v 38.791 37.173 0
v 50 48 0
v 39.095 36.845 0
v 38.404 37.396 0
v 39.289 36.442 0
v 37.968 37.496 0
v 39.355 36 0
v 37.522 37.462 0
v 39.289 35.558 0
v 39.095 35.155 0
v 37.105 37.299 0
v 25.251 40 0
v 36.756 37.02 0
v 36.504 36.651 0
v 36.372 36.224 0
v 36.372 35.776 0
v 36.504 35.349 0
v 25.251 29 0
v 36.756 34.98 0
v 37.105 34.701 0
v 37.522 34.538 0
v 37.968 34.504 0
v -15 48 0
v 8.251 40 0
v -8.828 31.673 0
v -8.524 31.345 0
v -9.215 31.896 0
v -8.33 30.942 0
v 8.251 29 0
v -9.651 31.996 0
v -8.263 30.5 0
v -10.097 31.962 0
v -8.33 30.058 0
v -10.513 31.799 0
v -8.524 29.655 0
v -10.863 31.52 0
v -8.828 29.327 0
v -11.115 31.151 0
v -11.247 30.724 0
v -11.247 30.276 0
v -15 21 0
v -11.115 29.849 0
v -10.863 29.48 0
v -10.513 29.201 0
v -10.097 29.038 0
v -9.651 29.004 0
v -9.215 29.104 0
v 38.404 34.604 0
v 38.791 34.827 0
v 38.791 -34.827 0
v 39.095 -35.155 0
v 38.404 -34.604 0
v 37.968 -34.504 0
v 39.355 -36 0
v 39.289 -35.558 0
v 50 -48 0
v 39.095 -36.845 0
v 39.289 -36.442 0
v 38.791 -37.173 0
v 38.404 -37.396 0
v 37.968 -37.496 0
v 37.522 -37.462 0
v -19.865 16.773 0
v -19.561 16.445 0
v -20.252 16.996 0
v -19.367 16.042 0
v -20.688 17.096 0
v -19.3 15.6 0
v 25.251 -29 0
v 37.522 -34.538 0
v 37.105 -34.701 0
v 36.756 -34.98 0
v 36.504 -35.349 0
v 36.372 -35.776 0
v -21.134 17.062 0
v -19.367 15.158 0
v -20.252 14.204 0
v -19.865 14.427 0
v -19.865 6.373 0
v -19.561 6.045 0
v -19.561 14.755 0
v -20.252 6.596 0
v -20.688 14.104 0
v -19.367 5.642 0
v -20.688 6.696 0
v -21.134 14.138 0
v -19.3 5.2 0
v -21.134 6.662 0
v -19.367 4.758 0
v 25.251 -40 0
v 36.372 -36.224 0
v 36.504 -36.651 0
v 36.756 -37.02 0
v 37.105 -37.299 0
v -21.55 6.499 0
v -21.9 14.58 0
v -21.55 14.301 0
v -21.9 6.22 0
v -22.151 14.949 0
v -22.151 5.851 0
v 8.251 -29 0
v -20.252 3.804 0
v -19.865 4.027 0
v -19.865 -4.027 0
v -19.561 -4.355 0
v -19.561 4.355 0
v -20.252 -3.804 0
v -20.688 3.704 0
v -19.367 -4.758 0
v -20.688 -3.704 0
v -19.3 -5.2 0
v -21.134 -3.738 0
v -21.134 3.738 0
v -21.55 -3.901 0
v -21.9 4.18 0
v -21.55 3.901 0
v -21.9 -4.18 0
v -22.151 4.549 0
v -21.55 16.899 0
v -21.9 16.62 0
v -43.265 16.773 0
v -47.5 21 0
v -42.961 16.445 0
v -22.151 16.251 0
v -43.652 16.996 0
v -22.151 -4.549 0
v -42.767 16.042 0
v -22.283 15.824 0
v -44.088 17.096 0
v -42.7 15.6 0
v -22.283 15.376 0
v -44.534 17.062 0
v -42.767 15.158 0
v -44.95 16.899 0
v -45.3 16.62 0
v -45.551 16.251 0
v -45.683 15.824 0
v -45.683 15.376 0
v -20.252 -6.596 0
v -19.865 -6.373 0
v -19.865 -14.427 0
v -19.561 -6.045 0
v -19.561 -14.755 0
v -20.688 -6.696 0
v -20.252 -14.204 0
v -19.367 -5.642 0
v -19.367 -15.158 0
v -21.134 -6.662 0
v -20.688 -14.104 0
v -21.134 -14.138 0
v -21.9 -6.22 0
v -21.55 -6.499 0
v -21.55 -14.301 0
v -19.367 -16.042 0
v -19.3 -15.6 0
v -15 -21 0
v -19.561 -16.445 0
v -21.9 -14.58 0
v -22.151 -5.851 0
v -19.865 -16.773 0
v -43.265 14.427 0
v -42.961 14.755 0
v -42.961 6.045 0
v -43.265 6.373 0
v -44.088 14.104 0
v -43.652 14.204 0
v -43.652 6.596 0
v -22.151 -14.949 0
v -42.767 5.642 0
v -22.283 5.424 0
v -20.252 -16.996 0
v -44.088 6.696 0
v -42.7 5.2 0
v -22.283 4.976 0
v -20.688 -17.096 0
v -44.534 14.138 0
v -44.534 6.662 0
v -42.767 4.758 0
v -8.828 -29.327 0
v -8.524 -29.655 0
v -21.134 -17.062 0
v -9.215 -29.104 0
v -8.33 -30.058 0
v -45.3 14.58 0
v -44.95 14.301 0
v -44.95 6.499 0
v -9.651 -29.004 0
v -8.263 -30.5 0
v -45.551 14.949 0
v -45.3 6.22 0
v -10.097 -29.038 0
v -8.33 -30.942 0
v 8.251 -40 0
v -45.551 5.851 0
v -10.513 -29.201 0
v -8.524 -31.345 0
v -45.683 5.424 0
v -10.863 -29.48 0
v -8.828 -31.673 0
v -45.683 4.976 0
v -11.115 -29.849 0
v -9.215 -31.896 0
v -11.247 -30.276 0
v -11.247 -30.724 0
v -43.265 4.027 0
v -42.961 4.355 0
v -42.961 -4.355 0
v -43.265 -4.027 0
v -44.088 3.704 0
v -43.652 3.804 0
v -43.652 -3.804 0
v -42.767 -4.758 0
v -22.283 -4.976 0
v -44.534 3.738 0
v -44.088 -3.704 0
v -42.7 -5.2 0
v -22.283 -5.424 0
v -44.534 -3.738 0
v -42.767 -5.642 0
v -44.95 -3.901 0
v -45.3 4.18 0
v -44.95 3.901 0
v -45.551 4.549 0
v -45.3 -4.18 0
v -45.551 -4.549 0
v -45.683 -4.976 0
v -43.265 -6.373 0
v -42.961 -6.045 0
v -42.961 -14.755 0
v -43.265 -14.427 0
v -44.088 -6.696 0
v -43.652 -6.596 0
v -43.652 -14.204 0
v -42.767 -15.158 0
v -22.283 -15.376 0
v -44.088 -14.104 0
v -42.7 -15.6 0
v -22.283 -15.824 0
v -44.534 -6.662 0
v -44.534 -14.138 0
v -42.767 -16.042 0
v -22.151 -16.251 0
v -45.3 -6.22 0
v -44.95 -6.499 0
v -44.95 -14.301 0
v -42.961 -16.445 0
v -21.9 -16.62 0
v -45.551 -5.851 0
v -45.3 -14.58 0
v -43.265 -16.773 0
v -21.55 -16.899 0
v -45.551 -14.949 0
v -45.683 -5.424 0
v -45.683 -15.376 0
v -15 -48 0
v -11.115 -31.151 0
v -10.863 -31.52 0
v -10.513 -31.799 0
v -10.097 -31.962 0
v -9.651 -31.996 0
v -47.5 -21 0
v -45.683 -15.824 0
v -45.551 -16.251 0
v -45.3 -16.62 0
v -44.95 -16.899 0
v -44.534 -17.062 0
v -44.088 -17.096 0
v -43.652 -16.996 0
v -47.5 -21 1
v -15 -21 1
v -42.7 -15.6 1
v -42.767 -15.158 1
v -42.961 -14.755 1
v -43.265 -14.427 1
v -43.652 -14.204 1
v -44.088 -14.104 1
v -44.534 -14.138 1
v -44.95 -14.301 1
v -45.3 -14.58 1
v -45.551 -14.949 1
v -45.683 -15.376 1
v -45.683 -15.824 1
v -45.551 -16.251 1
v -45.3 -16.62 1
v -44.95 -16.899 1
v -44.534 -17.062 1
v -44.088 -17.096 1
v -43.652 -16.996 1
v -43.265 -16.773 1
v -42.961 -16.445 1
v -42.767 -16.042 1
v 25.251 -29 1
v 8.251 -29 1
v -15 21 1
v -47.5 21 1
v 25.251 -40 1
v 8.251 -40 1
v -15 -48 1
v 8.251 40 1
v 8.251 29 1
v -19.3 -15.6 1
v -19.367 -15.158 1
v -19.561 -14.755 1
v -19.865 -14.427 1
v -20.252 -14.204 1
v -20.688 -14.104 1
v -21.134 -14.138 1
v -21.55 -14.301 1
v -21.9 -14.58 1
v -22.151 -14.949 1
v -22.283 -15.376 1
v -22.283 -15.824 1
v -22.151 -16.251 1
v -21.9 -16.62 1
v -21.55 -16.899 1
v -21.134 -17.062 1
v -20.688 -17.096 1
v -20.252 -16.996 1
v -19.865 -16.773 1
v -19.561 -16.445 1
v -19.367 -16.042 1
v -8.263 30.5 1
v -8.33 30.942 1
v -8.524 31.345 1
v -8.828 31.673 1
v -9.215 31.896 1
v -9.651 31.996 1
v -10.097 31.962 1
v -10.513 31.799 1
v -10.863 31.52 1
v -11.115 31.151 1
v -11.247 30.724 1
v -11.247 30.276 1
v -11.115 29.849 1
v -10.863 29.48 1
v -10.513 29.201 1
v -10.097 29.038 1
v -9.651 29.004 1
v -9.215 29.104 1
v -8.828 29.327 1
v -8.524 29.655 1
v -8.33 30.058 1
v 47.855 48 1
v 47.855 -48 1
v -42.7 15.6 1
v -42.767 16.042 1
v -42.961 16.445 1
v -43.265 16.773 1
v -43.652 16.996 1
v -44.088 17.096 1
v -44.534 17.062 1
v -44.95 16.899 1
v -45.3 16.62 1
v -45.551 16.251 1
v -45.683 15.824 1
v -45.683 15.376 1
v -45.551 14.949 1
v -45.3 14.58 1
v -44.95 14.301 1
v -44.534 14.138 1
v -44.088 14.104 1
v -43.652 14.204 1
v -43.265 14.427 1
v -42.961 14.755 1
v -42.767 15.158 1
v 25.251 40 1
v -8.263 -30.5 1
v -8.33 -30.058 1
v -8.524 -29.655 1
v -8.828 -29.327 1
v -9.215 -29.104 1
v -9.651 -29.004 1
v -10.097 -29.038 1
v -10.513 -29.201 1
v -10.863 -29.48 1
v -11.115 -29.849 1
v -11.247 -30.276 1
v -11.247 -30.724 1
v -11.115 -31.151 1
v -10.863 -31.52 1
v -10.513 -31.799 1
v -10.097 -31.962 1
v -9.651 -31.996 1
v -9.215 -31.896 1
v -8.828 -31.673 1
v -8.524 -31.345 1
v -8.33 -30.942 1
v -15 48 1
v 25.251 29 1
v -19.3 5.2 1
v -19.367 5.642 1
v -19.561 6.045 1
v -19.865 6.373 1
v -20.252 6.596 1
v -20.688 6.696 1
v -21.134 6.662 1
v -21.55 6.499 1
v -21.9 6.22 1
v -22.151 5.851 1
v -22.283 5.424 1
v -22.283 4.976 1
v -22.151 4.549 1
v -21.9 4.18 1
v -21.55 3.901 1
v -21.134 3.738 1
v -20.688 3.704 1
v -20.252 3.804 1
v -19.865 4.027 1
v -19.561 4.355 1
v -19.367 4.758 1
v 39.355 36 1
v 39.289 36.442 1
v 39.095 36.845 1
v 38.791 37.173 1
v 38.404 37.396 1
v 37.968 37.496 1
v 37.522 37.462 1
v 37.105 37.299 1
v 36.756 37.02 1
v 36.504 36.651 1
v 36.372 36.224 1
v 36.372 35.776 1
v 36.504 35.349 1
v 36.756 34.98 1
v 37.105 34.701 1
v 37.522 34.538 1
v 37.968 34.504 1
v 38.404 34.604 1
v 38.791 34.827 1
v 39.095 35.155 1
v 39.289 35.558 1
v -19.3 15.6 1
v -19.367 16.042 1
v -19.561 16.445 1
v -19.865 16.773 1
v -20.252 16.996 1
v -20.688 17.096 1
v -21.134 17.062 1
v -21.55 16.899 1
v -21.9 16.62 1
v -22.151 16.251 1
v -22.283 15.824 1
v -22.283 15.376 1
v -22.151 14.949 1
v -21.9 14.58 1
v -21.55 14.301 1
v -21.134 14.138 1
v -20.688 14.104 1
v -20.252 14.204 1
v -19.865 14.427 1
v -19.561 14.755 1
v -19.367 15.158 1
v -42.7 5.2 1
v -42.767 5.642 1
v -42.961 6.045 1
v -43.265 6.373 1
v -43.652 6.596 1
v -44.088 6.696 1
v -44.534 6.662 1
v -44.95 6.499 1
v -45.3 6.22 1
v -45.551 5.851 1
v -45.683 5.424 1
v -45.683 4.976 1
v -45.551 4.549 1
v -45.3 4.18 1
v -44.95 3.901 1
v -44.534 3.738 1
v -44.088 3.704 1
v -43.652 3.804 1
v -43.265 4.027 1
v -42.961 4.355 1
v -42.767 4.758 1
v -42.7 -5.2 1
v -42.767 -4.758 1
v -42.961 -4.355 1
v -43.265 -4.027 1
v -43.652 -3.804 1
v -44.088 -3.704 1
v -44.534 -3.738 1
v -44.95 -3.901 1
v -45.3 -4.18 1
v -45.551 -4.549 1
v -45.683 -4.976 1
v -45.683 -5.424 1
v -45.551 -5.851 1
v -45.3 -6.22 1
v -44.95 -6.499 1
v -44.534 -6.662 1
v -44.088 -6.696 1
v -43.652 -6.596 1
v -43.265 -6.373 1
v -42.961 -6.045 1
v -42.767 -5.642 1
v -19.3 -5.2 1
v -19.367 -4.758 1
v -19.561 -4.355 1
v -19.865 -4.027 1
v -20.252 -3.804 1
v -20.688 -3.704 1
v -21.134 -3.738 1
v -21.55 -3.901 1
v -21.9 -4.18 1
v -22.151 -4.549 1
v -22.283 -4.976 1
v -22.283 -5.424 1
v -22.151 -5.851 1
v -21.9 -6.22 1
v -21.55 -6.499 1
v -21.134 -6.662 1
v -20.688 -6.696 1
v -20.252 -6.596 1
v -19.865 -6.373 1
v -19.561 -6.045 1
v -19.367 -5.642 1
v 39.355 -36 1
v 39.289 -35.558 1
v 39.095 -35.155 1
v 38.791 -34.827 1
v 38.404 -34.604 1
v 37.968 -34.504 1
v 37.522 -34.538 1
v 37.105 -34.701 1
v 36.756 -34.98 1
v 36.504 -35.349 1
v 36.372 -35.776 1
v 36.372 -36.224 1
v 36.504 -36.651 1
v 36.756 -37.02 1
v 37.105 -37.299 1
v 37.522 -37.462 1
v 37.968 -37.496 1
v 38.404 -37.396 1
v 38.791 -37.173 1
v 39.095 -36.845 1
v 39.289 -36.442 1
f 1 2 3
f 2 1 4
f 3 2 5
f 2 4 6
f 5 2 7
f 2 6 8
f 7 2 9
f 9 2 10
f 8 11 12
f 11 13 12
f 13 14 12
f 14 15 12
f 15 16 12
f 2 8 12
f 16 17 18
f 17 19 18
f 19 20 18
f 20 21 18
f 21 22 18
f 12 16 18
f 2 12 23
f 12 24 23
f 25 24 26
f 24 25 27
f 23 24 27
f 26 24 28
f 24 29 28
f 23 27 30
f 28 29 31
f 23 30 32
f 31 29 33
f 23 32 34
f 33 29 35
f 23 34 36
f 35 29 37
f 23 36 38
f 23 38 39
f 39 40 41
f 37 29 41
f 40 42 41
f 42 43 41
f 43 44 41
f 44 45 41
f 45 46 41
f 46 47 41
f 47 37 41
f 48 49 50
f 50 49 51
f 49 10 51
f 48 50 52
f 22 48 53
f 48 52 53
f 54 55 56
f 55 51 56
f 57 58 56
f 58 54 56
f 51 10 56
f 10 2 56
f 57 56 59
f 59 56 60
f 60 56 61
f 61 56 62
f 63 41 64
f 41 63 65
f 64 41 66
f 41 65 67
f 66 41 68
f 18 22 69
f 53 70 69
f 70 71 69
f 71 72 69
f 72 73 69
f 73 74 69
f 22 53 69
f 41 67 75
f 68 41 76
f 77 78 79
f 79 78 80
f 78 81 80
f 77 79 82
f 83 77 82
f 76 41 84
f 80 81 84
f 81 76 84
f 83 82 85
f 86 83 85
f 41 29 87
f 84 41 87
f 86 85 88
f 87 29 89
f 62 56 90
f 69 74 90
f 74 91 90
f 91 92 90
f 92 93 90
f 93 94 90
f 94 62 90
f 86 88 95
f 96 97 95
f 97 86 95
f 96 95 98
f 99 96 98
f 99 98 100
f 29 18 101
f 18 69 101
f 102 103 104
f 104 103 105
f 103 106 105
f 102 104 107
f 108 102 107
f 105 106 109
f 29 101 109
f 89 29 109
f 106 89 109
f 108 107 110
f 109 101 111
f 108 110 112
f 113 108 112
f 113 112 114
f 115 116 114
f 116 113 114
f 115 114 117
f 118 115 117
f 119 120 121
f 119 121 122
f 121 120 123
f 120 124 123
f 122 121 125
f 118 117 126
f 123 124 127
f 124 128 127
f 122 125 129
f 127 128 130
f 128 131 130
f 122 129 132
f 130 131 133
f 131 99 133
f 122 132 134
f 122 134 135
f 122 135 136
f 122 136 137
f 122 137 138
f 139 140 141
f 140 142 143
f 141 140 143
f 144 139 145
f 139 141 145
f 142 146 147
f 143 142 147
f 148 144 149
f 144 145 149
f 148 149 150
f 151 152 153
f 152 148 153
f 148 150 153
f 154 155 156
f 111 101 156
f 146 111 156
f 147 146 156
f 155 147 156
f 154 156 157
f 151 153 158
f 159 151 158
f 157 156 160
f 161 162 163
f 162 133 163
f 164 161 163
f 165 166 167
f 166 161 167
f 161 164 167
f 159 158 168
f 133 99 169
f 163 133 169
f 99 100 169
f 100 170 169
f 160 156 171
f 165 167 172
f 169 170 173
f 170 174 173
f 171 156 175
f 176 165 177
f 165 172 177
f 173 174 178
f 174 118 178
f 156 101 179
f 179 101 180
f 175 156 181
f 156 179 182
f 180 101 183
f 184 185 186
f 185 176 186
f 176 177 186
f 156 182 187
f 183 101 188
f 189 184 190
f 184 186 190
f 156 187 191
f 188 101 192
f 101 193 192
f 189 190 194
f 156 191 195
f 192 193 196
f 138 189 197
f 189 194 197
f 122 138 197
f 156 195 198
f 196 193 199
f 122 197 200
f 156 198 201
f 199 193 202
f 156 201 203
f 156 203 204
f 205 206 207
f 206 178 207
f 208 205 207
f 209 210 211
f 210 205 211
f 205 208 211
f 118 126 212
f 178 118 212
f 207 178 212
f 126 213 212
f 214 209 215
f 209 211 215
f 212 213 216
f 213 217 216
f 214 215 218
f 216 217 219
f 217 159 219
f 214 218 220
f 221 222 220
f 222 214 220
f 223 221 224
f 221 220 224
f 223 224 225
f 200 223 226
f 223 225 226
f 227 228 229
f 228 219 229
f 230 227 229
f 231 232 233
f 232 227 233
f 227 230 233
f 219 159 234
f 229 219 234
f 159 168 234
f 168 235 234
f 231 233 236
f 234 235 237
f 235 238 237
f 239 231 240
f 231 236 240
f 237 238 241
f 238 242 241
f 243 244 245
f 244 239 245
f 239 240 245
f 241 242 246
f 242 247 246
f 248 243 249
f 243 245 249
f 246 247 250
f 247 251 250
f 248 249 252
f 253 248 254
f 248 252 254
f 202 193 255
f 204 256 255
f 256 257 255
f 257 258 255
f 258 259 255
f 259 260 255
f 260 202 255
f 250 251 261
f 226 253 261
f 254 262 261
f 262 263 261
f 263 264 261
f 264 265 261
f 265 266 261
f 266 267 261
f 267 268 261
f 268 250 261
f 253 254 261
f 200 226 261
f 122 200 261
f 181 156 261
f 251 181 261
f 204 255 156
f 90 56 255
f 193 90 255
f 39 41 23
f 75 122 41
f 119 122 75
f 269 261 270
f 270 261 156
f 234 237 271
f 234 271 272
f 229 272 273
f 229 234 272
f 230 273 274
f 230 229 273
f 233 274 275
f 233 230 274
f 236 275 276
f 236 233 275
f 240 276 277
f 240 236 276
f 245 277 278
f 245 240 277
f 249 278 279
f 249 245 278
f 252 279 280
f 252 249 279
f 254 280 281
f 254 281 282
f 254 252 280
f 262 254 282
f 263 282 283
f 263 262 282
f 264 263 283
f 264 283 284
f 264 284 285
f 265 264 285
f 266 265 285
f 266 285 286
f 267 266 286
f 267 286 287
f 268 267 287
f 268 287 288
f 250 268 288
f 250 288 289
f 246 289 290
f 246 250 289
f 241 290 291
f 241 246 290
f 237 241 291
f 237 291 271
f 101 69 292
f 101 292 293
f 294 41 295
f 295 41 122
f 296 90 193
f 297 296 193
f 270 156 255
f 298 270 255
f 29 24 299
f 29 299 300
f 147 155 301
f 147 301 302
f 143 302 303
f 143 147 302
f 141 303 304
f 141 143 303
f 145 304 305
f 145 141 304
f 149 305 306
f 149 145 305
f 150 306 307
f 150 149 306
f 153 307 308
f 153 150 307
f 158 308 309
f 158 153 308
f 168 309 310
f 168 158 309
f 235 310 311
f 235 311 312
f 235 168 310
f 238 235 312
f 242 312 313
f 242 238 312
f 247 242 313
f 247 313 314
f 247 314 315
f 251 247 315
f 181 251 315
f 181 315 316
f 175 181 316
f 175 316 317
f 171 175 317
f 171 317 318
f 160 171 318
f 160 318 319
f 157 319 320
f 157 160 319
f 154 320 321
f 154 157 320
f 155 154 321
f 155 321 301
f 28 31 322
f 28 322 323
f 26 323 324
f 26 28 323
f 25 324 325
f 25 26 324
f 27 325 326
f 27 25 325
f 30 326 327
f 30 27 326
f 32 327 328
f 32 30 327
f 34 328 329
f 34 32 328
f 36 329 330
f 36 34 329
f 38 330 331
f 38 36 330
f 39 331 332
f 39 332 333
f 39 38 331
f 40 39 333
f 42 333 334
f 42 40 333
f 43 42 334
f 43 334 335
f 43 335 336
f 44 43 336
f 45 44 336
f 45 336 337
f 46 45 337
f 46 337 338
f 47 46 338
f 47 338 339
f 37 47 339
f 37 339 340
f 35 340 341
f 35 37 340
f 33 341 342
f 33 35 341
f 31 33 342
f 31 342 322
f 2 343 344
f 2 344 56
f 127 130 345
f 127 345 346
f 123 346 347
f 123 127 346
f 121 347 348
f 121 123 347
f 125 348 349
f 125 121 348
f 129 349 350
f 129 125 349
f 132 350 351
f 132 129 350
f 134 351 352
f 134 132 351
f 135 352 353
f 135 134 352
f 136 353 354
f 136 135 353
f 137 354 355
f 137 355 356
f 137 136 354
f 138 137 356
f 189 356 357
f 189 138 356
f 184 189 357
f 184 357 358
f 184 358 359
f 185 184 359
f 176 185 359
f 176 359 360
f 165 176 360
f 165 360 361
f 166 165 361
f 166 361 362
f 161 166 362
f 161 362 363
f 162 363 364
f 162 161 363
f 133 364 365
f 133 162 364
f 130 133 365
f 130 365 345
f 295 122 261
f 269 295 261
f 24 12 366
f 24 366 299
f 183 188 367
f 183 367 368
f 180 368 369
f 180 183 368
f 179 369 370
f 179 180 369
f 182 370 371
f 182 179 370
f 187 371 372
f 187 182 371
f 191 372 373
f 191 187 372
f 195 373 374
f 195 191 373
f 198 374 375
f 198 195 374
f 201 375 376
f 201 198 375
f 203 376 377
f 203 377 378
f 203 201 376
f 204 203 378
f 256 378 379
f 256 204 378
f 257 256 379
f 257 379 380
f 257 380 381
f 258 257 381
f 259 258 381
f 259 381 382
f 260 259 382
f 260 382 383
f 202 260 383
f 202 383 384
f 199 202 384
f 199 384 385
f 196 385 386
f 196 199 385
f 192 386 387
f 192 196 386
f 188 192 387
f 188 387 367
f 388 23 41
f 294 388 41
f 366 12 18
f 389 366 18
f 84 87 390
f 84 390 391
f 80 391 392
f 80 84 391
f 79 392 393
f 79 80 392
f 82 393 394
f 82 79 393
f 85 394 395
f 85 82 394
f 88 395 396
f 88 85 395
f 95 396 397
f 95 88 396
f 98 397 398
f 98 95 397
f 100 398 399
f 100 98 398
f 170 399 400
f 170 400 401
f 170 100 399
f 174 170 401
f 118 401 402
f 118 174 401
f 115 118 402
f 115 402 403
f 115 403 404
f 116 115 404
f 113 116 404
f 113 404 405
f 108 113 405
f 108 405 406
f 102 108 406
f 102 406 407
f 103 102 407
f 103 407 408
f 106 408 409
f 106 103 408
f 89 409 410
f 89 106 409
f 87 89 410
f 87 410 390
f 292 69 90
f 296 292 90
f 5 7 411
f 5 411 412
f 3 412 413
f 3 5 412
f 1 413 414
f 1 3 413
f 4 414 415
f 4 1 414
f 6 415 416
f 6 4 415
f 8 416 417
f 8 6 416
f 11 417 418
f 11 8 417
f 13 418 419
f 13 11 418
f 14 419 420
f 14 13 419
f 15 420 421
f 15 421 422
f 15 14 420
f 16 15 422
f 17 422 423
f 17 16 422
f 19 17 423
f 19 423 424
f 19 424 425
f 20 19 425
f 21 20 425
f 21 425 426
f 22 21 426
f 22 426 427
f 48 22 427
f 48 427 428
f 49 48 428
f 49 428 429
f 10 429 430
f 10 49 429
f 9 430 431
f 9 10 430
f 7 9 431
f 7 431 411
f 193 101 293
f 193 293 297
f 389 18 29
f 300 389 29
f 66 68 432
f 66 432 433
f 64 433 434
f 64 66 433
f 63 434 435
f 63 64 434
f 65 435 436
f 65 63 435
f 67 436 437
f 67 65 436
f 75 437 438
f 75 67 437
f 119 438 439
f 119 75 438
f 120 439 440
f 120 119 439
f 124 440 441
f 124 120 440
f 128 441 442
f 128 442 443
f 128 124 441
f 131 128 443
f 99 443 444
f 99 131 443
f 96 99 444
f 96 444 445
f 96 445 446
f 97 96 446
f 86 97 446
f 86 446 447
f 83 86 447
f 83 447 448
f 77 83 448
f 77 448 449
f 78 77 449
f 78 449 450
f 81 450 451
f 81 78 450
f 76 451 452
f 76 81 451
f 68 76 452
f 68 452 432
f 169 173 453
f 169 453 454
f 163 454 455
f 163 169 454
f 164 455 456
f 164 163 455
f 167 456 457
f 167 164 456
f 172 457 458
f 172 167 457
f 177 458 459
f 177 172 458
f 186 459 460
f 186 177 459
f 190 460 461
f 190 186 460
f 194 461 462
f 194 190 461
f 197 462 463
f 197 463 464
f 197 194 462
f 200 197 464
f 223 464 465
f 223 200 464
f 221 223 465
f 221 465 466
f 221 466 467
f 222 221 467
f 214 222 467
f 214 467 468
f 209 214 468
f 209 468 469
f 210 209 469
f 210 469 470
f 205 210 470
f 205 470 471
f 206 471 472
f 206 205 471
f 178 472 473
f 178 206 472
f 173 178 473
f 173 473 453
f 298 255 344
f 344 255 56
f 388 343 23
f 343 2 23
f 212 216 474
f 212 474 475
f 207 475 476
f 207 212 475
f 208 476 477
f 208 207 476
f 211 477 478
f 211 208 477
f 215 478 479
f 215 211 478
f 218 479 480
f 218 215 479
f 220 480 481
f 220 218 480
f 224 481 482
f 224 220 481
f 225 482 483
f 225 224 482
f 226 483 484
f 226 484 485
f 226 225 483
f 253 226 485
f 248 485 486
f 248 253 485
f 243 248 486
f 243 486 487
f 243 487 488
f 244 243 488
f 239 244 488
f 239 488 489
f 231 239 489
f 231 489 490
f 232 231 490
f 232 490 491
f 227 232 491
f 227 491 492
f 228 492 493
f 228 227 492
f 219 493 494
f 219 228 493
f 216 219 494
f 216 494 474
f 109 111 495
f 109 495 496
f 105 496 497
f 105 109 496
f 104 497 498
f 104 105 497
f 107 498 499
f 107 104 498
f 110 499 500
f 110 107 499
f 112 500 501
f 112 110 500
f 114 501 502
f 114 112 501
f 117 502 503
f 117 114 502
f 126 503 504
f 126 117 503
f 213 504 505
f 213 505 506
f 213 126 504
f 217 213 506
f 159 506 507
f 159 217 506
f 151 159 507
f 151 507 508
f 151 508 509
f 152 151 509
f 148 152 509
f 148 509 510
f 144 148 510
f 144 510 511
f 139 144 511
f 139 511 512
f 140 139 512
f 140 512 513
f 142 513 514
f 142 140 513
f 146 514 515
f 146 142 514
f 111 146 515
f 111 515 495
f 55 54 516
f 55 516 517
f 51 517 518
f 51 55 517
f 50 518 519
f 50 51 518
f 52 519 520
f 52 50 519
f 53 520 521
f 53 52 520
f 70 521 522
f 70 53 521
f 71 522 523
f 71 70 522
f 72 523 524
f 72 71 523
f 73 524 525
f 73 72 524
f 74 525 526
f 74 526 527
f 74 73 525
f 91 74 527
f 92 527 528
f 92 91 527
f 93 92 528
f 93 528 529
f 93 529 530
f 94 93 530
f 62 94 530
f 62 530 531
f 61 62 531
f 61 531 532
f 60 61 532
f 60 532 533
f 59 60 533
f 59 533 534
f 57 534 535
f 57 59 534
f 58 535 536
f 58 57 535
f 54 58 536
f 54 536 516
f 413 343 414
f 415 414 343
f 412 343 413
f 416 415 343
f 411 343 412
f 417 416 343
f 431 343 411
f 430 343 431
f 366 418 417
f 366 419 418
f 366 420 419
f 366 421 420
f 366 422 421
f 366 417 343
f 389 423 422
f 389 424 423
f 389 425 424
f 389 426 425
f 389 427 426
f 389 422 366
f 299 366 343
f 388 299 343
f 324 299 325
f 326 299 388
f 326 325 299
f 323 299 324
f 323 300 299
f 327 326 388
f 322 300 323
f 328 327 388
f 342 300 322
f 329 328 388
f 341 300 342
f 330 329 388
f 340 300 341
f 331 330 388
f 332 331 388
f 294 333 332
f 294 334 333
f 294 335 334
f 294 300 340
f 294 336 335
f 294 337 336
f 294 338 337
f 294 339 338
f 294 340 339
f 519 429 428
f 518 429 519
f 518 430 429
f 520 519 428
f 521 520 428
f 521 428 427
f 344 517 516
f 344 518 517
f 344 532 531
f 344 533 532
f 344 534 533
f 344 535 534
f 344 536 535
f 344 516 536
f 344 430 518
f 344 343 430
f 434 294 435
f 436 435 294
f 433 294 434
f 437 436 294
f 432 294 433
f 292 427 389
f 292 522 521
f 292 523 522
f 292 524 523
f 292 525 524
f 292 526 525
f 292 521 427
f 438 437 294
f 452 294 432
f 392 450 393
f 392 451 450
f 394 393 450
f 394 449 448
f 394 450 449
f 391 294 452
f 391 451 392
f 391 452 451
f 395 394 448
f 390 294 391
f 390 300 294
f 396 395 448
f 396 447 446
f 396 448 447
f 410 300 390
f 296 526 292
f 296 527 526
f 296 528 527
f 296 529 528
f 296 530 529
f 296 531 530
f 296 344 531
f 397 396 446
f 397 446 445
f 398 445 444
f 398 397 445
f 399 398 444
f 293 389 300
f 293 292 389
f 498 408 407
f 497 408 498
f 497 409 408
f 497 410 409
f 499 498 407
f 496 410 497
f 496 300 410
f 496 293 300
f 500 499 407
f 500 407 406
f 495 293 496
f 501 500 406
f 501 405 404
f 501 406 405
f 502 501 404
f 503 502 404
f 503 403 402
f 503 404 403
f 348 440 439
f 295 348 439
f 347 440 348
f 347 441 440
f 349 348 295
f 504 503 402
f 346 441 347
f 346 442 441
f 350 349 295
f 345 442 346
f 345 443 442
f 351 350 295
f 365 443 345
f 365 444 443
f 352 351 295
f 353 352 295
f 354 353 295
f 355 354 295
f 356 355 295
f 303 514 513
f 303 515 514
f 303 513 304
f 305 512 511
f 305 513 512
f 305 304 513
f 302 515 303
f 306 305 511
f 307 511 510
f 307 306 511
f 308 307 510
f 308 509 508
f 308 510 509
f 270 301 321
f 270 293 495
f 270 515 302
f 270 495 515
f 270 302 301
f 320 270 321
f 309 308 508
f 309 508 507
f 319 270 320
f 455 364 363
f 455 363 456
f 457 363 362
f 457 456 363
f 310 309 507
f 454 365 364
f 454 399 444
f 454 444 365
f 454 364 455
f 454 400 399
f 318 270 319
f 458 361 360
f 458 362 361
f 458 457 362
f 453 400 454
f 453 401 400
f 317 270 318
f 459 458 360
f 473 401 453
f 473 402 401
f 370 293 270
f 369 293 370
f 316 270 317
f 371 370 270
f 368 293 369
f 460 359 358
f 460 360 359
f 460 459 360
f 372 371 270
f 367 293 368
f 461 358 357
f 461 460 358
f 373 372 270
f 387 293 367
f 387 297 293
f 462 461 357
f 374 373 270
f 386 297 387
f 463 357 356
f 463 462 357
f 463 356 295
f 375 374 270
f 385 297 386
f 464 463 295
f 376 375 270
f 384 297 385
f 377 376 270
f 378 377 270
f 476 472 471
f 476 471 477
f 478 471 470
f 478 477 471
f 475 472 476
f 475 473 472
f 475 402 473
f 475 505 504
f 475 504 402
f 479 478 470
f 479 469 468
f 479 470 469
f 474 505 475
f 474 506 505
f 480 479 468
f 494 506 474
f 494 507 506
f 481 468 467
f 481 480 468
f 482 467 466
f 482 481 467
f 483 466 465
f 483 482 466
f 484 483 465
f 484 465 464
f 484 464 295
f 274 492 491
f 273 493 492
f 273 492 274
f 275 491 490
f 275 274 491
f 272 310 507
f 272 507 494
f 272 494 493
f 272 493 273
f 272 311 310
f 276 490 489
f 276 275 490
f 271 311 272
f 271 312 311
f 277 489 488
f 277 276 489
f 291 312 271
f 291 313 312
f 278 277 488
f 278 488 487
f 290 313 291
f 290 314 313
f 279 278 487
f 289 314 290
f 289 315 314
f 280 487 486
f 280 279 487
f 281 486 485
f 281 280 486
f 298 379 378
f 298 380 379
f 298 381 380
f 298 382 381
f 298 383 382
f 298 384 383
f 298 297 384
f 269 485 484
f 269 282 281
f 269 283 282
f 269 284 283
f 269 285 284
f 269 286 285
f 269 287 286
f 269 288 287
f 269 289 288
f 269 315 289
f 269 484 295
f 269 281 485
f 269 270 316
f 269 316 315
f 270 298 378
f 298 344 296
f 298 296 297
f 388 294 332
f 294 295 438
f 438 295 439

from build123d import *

# Parameters (mm, degrees)
SKETCH_1_R          = 1.5
SKETCH_1_W          = 17
SKETCH_1_H          = 11
EXTRUDE_1_DEPTH     = 1
CUT_EXTRUDE_1_DEPTH = 109.245092268


with BuildPart() as part:
    # Эскиз1 → Бобышка-Вытянуть1 (new body)
    with BuildSketch(Plane(origin=(0, 0, 0), x_dir=(-1, 0, 0), z_dir=(0, 0, 1))):
        Polygon((47.5, 21), (15, 21), (15, 48), (-50, 48), (-50, -48), (15, -48), (15, -21), (47.5, -21), align=None)
        with Locations(Location((20.8, -15.6, 0), (0, 0, 180))):
            Circle(SKETCH_1_R, mode=Mode.SUBTRACT)
        with Locations(Location((20.8, -5.2, 0), (0, 0, 180))):
            Circle(SKETCH_1_R, mode=Mode.SUBTRACT)
        with Locations(Location((20.8, 5.2, 0), (0, 0, 180))):
            Circle(SKETCH_1_R, mode=Mode.SUBTRACT)
        with Locations(Location((20.8, 15.6, 0), (0, 0, 180))):
            Circle(SKETCH_1_R, mode=Mode.SUBTRACT)
        with Locations(Location((44.2, -15.6, 0), (0, 0, 180))):
            Circle(SKETCH_1_R, mode=Mode.SUBTRACT)
        with Locations(Location((44.2, -5.2, 0), (0, 0, 180))):
            Circle(SKETCH_1_R, mode=Mode.SUBTRACT)
        with Locations(Location((44.2, 5.2, 0), (0, 0, 180))):
            Circle(SKETCH_1_R, mode=Mode.SUBTRACT)
        with Locations(Location((44.2, 15.6, 0), (0, 0, 180))):
            Circle(SKETCH_1_R, mode=Mode.SUBTRACT)
        with Locations(Location((9.763297689, -30.5, 0), (0, 0, 180))):
            Circle(SKETCH_1_R, mode=Mode.SUBTRACT)
        with Locations(Location((9.763297689, 30.5, 0), (0, 0, 180))):
            Circle(SKETCH_1_R, mode=Mode.SUBTRACT)
        with Locations(Location((-37.855493079, -36, 0), (0, 0, 180))):
            Circle(SKETCH_1_R, mode=Mode.SUBTRACT)
        with Locations(Location((-37.855493079, 36, 0), (0, 0, 180))):
            Circle(SKETCH_1_R, mode=Mode.SUBTRACT)
        with Locations((-16.751430991, 34.5)):
            Rectangle(SKETCH_1_W, SKETCH_1_H, mode=Mode.SUBTRACT)
        with Locations((-16.751430991, -34.5)):
            Rectangle(SKETCH_1_W, SKETCH_1_H, mode=Mode.SUBTRACT)
    extrude(amount=EXTRUDE_1_DEPTH)

    # Эскиз2 → Вырез-Вытянуть1 (cut, through all)
    with BuildSketch(Plane(origin=(0, 48, 0), x_dir=(1, 0, 0), z_dir=(0, 1, 0))):
        Polygon((47.855493079, -1), (50, 0), (50, -1), align=None)
    extrude(amount=-CUT_EXTRUDE_1_DEPTH, mode=Mode.SUBTRACT)


solid = part.part
